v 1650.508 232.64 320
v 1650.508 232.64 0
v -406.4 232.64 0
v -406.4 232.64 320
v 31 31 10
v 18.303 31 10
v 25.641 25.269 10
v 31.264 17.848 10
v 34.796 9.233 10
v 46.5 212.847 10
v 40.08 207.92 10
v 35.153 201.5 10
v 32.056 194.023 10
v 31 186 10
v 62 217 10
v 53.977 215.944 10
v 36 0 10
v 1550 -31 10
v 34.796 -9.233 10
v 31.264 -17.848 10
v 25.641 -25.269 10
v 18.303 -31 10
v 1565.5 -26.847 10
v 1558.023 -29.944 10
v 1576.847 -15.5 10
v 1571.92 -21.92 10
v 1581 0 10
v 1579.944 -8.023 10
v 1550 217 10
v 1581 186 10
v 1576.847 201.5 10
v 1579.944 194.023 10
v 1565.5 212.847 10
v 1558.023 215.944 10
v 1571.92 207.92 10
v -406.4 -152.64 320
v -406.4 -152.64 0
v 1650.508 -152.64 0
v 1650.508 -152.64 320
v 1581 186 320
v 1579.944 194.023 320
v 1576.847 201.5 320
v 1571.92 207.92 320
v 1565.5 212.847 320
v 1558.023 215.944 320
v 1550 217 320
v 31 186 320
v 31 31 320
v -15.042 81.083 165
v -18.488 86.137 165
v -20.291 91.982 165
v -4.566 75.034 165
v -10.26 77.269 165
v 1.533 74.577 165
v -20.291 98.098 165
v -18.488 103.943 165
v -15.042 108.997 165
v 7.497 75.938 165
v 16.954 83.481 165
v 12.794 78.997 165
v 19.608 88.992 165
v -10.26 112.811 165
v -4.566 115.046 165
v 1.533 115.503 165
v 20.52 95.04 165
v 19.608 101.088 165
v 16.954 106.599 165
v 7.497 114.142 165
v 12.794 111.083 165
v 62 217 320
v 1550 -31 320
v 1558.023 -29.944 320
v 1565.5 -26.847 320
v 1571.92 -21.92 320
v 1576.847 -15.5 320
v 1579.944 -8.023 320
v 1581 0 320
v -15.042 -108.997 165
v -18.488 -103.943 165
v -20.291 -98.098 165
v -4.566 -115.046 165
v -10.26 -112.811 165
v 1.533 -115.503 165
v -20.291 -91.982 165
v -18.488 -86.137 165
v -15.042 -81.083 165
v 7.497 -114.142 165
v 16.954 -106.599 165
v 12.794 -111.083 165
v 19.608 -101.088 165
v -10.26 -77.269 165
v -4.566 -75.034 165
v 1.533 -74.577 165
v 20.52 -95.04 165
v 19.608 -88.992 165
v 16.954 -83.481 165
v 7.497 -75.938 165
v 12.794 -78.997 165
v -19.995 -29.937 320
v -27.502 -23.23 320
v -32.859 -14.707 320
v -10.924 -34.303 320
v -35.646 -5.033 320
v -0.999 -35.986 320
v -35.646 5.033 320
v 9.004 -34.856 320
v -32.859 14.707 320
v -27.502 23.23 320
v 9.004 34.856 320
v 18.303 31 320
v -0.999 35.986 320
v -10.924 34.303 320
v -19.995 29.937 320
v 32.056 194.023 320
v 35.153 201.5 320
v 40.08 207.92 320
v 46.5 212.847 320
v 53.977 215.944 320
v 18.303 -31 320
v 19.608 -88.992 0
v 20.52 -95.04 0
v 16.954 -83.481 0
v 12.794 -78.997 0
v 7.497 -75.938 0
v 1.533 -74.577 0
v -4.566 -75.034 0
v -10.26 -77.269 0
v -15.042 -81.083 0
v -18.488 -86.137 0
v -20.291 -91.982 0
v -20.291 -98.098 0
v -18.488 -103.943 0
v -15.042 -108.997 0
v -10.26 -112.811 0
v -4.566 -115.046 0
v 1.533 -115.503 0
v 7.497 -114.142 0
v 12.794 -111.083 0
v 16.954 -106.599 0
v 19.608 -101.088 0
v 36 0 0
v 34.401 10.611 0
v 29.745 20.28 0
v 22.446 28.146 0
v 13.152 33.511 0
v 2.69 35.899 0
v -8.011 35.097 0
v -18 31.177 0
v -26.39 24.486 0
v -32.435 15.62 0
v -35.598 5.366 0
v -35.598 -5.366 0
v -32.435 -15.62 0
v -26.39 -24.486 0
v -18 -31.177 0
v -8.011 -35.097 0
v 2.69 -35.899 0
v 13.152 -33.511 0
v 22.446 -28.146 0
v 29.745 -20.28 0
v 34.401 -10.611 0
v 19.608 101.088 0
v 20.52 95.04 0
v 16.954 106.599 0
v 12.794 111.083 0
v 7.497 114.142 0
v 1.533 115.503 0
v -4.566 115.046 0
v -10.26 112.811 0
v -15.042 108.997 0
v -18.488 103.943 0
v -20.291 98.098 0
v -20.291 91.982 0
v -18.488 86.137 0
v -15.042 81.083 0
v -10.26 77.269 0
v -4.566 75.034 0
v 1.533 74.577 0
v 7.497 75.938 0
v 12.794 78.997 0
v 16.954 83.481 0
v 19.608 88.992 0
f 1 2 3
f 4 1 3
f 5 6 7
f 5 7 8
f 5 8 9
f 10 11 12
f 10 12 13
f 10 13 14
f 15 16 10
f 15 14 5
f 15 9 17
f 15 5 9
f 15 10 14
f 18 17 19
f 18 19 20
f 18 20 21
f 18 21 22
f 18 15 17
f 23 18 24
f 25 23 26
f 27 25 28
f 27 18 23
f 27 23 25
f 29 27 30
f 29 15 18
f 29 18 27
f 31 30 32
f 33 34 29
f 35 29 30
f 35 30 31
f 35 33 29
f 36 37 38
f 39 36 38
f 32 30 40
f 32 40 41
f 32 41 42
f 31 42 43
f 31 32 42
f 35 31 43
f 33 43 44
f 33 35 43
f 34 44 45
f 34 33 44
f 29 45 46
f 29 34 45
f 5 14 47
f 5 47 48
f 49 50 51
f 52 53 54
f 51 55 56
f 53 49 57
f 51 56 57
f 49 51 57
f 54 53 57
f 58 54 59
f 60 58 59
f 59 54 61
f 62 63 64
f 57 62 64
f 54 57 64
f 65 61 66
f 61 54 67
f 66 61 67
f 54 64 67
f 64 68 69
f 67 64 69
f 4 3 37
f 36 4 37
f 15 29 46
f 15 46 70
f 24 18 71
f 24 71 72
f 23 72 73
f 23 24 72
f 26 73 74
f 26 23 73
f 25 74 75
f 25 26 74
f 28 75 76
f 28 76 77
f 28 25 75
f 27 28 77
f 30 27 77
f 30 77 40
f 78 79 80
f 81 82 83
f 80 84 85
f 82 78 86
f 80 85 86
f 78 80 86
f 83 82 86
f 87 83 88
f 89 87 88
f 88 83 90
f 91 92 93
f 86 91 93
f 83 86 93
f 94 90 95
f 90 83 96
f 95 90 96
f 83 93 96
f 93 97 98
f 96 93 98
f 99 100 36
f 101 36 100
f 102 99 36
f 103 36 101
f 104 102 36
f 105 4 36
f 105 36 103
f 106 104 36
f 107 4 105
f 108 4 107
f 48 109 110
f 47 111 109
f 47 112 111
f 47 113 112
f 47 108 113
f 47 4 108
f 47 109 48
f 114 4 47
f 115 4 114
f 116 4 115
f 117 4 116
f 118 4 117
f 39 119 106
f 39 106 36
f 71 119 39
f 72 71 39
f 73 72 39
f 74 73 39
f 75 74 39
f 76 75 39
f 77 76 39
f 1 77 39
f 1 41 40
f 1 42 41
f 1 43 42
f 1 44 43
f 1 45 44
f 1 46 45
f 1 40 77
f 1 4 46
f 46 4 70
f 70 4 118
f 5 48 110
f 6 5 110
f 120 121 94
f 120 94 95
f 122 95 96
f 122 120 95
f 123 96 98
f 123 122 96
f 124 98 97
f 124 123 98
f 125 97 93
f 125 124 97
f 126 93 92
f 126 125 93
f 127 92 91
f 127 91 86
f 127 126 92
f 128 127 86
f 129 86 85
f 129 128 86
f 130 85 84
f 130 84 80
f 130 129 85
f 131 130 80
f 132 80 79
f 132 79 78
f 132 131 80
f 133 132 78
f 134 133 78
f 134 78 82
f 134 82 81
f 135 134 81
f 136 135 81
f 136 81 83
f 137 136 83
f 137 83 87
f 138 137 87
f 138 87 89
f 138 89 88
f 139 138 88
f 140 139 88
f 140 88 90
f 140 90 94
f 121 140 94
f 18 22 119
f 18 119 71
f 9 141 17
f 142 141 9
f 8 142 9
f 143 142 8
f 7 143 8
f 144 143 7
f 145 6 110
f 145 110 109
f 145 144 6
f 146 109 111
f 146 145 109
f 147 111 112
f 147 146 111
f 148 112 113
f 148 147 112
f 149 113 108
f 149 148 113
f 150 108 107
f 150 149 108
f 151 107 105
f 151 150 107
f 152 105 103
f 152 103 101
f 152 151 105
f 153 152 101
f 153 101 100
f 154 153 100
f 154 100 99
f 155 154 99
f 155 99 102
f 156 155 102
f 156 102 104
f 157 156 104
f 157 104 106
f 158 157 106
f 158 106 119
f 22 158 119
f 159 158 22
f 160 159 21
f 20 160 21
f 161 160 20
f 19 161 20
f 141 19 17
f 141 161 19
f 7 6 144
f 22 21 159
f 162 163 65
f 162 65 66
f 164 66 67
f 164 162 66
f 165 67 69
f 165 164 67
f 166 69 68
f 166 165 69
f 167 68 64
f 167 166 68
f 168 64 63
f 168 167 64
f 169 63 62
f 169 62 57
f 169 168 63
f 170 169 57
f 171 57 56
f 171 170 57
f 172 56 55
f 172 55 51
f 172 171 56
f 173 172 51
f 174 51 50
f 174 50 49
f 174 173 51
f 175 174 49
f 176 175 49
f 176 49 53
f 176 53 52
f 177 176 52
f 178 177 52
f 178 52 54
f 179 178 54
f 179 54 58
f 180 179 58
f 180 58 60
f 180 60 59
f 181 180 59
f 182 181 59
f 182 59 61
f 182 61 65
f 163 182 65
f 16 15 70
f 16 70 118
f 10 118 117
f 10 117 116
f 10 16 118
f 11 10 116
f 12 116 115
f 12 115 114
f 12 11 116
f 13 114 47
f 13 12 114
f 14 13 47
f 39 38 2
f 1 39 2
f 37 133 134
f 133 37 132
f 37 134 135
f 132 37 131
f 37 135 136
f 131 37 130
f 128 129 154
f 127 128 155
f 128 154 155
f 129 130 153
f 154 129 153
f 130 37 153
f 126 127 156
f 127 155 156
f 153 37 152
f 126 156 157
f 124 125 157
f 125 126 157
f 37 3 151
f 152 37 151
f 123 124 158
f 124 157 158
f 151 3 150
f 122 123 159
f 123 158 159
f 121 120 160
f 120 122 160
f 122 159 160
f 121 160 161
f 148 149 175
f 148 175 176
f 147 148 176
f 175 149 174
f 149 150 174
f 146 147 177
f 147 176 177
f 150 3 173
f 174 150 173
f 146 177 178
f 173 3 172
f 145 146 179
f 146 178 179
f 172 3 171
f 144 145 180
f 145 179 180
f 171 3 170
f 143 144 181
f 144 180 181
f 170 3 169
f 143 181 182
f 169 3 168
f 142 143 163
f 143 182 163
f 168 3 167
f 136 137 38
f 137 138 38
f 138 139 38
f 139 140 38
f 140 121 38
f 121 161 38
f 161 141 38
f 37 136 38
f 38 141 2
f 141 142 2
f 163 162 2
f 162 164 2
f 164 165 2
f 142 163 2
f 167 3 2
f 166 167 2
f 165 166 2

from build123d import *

# Parameters (mm, degrees)
SKETCH1_R           = 36
SKETCH1_R_2         = 20.52
BOSS_EXTRUDE1_DEPTH = 320
CUT_EXTRUDE1_START  = -310
CUT_EXTRUDE1_DEPTH  = 310
BOSS_EXTRUDE2_START = -155
SKETCH3_R           = 20.52
BOSS_EXTRUDE2_DEPTH = 155


with BuildPart() as part:
    # Sketch1 → Boss-Extrude1 (new body)
    with BuildSketch(Plane.XY):
        Polygon((-406.4, -152.64), (406.4, -152.64), (1650.508092605, -152.64), (1650.508092605, 232.64), (-406.4, 232.64), (-406.4, 152.64), align=None)
        Circle(SKETCH1_R, mode=Mode.SUBTRACT)
        with Locations((0, 95.04)):
            Circle(SKETCH1_R_2, mode=Mode.SUBTRACT)
        with Locations((0, -95.04)):
            Circle(SKETCH1_R_2, mode=Mode.SUBTRACT)
    extrude(amount=BOSS_EXTRUDE1_DEPTH)

    # Sketch2 → Cut-Extrude1 (cut)
    with BuildSketch(Plane.XY.offset(320).offset(CUT_EXTRUDE1_START)):
        with BuildLine():
            ThreePointArc((1550, -31), (1571.920310217, -21.920310217), (1581, 0))
            Line((1581, 0), (1581, 186))
            ThreePointArc((1581, 186), (1571.920310217, 207.920310217), (1550, 217))
            Line((1550, 217), (62, 217))
            ThreePointArc((62, 217), (40.079689783, 207.920310217), (31, 186))
            Line((31, 186), (31, 53.469630572))
            Line((31, 53.469630572), (31, 31))
            Line((31, 31), (18.303005218, 31))
            ThreePointArc((18.303005218, 31), (31.264262248, 17.847854383), (36, 0))
            ThreePointArc((36, 0), (31.264262248, -17.847854383), (18.303005218, -31))
            Line((18.303005218, -31), (1550, -31))
        make_face()
    extrude(amount=CUT_EXTRUDE1_DEPTH, mode=Mode.SUBTRACT)

    # Sketch3 → Boss-Extrude2 (add)
    with BuildSketch(Plane.XY.offset(320).offset(BOSS_EXTRUDE2_START)):
        with Locations((0, 95.04)):
            Circle(SKETCH3_R)
        with Locations((0, -95.04)):
            Circle(SKETCH3_R)
    extrude(amount=BOSS_EXTRUDE2_DEPTH)


solid = part.part
